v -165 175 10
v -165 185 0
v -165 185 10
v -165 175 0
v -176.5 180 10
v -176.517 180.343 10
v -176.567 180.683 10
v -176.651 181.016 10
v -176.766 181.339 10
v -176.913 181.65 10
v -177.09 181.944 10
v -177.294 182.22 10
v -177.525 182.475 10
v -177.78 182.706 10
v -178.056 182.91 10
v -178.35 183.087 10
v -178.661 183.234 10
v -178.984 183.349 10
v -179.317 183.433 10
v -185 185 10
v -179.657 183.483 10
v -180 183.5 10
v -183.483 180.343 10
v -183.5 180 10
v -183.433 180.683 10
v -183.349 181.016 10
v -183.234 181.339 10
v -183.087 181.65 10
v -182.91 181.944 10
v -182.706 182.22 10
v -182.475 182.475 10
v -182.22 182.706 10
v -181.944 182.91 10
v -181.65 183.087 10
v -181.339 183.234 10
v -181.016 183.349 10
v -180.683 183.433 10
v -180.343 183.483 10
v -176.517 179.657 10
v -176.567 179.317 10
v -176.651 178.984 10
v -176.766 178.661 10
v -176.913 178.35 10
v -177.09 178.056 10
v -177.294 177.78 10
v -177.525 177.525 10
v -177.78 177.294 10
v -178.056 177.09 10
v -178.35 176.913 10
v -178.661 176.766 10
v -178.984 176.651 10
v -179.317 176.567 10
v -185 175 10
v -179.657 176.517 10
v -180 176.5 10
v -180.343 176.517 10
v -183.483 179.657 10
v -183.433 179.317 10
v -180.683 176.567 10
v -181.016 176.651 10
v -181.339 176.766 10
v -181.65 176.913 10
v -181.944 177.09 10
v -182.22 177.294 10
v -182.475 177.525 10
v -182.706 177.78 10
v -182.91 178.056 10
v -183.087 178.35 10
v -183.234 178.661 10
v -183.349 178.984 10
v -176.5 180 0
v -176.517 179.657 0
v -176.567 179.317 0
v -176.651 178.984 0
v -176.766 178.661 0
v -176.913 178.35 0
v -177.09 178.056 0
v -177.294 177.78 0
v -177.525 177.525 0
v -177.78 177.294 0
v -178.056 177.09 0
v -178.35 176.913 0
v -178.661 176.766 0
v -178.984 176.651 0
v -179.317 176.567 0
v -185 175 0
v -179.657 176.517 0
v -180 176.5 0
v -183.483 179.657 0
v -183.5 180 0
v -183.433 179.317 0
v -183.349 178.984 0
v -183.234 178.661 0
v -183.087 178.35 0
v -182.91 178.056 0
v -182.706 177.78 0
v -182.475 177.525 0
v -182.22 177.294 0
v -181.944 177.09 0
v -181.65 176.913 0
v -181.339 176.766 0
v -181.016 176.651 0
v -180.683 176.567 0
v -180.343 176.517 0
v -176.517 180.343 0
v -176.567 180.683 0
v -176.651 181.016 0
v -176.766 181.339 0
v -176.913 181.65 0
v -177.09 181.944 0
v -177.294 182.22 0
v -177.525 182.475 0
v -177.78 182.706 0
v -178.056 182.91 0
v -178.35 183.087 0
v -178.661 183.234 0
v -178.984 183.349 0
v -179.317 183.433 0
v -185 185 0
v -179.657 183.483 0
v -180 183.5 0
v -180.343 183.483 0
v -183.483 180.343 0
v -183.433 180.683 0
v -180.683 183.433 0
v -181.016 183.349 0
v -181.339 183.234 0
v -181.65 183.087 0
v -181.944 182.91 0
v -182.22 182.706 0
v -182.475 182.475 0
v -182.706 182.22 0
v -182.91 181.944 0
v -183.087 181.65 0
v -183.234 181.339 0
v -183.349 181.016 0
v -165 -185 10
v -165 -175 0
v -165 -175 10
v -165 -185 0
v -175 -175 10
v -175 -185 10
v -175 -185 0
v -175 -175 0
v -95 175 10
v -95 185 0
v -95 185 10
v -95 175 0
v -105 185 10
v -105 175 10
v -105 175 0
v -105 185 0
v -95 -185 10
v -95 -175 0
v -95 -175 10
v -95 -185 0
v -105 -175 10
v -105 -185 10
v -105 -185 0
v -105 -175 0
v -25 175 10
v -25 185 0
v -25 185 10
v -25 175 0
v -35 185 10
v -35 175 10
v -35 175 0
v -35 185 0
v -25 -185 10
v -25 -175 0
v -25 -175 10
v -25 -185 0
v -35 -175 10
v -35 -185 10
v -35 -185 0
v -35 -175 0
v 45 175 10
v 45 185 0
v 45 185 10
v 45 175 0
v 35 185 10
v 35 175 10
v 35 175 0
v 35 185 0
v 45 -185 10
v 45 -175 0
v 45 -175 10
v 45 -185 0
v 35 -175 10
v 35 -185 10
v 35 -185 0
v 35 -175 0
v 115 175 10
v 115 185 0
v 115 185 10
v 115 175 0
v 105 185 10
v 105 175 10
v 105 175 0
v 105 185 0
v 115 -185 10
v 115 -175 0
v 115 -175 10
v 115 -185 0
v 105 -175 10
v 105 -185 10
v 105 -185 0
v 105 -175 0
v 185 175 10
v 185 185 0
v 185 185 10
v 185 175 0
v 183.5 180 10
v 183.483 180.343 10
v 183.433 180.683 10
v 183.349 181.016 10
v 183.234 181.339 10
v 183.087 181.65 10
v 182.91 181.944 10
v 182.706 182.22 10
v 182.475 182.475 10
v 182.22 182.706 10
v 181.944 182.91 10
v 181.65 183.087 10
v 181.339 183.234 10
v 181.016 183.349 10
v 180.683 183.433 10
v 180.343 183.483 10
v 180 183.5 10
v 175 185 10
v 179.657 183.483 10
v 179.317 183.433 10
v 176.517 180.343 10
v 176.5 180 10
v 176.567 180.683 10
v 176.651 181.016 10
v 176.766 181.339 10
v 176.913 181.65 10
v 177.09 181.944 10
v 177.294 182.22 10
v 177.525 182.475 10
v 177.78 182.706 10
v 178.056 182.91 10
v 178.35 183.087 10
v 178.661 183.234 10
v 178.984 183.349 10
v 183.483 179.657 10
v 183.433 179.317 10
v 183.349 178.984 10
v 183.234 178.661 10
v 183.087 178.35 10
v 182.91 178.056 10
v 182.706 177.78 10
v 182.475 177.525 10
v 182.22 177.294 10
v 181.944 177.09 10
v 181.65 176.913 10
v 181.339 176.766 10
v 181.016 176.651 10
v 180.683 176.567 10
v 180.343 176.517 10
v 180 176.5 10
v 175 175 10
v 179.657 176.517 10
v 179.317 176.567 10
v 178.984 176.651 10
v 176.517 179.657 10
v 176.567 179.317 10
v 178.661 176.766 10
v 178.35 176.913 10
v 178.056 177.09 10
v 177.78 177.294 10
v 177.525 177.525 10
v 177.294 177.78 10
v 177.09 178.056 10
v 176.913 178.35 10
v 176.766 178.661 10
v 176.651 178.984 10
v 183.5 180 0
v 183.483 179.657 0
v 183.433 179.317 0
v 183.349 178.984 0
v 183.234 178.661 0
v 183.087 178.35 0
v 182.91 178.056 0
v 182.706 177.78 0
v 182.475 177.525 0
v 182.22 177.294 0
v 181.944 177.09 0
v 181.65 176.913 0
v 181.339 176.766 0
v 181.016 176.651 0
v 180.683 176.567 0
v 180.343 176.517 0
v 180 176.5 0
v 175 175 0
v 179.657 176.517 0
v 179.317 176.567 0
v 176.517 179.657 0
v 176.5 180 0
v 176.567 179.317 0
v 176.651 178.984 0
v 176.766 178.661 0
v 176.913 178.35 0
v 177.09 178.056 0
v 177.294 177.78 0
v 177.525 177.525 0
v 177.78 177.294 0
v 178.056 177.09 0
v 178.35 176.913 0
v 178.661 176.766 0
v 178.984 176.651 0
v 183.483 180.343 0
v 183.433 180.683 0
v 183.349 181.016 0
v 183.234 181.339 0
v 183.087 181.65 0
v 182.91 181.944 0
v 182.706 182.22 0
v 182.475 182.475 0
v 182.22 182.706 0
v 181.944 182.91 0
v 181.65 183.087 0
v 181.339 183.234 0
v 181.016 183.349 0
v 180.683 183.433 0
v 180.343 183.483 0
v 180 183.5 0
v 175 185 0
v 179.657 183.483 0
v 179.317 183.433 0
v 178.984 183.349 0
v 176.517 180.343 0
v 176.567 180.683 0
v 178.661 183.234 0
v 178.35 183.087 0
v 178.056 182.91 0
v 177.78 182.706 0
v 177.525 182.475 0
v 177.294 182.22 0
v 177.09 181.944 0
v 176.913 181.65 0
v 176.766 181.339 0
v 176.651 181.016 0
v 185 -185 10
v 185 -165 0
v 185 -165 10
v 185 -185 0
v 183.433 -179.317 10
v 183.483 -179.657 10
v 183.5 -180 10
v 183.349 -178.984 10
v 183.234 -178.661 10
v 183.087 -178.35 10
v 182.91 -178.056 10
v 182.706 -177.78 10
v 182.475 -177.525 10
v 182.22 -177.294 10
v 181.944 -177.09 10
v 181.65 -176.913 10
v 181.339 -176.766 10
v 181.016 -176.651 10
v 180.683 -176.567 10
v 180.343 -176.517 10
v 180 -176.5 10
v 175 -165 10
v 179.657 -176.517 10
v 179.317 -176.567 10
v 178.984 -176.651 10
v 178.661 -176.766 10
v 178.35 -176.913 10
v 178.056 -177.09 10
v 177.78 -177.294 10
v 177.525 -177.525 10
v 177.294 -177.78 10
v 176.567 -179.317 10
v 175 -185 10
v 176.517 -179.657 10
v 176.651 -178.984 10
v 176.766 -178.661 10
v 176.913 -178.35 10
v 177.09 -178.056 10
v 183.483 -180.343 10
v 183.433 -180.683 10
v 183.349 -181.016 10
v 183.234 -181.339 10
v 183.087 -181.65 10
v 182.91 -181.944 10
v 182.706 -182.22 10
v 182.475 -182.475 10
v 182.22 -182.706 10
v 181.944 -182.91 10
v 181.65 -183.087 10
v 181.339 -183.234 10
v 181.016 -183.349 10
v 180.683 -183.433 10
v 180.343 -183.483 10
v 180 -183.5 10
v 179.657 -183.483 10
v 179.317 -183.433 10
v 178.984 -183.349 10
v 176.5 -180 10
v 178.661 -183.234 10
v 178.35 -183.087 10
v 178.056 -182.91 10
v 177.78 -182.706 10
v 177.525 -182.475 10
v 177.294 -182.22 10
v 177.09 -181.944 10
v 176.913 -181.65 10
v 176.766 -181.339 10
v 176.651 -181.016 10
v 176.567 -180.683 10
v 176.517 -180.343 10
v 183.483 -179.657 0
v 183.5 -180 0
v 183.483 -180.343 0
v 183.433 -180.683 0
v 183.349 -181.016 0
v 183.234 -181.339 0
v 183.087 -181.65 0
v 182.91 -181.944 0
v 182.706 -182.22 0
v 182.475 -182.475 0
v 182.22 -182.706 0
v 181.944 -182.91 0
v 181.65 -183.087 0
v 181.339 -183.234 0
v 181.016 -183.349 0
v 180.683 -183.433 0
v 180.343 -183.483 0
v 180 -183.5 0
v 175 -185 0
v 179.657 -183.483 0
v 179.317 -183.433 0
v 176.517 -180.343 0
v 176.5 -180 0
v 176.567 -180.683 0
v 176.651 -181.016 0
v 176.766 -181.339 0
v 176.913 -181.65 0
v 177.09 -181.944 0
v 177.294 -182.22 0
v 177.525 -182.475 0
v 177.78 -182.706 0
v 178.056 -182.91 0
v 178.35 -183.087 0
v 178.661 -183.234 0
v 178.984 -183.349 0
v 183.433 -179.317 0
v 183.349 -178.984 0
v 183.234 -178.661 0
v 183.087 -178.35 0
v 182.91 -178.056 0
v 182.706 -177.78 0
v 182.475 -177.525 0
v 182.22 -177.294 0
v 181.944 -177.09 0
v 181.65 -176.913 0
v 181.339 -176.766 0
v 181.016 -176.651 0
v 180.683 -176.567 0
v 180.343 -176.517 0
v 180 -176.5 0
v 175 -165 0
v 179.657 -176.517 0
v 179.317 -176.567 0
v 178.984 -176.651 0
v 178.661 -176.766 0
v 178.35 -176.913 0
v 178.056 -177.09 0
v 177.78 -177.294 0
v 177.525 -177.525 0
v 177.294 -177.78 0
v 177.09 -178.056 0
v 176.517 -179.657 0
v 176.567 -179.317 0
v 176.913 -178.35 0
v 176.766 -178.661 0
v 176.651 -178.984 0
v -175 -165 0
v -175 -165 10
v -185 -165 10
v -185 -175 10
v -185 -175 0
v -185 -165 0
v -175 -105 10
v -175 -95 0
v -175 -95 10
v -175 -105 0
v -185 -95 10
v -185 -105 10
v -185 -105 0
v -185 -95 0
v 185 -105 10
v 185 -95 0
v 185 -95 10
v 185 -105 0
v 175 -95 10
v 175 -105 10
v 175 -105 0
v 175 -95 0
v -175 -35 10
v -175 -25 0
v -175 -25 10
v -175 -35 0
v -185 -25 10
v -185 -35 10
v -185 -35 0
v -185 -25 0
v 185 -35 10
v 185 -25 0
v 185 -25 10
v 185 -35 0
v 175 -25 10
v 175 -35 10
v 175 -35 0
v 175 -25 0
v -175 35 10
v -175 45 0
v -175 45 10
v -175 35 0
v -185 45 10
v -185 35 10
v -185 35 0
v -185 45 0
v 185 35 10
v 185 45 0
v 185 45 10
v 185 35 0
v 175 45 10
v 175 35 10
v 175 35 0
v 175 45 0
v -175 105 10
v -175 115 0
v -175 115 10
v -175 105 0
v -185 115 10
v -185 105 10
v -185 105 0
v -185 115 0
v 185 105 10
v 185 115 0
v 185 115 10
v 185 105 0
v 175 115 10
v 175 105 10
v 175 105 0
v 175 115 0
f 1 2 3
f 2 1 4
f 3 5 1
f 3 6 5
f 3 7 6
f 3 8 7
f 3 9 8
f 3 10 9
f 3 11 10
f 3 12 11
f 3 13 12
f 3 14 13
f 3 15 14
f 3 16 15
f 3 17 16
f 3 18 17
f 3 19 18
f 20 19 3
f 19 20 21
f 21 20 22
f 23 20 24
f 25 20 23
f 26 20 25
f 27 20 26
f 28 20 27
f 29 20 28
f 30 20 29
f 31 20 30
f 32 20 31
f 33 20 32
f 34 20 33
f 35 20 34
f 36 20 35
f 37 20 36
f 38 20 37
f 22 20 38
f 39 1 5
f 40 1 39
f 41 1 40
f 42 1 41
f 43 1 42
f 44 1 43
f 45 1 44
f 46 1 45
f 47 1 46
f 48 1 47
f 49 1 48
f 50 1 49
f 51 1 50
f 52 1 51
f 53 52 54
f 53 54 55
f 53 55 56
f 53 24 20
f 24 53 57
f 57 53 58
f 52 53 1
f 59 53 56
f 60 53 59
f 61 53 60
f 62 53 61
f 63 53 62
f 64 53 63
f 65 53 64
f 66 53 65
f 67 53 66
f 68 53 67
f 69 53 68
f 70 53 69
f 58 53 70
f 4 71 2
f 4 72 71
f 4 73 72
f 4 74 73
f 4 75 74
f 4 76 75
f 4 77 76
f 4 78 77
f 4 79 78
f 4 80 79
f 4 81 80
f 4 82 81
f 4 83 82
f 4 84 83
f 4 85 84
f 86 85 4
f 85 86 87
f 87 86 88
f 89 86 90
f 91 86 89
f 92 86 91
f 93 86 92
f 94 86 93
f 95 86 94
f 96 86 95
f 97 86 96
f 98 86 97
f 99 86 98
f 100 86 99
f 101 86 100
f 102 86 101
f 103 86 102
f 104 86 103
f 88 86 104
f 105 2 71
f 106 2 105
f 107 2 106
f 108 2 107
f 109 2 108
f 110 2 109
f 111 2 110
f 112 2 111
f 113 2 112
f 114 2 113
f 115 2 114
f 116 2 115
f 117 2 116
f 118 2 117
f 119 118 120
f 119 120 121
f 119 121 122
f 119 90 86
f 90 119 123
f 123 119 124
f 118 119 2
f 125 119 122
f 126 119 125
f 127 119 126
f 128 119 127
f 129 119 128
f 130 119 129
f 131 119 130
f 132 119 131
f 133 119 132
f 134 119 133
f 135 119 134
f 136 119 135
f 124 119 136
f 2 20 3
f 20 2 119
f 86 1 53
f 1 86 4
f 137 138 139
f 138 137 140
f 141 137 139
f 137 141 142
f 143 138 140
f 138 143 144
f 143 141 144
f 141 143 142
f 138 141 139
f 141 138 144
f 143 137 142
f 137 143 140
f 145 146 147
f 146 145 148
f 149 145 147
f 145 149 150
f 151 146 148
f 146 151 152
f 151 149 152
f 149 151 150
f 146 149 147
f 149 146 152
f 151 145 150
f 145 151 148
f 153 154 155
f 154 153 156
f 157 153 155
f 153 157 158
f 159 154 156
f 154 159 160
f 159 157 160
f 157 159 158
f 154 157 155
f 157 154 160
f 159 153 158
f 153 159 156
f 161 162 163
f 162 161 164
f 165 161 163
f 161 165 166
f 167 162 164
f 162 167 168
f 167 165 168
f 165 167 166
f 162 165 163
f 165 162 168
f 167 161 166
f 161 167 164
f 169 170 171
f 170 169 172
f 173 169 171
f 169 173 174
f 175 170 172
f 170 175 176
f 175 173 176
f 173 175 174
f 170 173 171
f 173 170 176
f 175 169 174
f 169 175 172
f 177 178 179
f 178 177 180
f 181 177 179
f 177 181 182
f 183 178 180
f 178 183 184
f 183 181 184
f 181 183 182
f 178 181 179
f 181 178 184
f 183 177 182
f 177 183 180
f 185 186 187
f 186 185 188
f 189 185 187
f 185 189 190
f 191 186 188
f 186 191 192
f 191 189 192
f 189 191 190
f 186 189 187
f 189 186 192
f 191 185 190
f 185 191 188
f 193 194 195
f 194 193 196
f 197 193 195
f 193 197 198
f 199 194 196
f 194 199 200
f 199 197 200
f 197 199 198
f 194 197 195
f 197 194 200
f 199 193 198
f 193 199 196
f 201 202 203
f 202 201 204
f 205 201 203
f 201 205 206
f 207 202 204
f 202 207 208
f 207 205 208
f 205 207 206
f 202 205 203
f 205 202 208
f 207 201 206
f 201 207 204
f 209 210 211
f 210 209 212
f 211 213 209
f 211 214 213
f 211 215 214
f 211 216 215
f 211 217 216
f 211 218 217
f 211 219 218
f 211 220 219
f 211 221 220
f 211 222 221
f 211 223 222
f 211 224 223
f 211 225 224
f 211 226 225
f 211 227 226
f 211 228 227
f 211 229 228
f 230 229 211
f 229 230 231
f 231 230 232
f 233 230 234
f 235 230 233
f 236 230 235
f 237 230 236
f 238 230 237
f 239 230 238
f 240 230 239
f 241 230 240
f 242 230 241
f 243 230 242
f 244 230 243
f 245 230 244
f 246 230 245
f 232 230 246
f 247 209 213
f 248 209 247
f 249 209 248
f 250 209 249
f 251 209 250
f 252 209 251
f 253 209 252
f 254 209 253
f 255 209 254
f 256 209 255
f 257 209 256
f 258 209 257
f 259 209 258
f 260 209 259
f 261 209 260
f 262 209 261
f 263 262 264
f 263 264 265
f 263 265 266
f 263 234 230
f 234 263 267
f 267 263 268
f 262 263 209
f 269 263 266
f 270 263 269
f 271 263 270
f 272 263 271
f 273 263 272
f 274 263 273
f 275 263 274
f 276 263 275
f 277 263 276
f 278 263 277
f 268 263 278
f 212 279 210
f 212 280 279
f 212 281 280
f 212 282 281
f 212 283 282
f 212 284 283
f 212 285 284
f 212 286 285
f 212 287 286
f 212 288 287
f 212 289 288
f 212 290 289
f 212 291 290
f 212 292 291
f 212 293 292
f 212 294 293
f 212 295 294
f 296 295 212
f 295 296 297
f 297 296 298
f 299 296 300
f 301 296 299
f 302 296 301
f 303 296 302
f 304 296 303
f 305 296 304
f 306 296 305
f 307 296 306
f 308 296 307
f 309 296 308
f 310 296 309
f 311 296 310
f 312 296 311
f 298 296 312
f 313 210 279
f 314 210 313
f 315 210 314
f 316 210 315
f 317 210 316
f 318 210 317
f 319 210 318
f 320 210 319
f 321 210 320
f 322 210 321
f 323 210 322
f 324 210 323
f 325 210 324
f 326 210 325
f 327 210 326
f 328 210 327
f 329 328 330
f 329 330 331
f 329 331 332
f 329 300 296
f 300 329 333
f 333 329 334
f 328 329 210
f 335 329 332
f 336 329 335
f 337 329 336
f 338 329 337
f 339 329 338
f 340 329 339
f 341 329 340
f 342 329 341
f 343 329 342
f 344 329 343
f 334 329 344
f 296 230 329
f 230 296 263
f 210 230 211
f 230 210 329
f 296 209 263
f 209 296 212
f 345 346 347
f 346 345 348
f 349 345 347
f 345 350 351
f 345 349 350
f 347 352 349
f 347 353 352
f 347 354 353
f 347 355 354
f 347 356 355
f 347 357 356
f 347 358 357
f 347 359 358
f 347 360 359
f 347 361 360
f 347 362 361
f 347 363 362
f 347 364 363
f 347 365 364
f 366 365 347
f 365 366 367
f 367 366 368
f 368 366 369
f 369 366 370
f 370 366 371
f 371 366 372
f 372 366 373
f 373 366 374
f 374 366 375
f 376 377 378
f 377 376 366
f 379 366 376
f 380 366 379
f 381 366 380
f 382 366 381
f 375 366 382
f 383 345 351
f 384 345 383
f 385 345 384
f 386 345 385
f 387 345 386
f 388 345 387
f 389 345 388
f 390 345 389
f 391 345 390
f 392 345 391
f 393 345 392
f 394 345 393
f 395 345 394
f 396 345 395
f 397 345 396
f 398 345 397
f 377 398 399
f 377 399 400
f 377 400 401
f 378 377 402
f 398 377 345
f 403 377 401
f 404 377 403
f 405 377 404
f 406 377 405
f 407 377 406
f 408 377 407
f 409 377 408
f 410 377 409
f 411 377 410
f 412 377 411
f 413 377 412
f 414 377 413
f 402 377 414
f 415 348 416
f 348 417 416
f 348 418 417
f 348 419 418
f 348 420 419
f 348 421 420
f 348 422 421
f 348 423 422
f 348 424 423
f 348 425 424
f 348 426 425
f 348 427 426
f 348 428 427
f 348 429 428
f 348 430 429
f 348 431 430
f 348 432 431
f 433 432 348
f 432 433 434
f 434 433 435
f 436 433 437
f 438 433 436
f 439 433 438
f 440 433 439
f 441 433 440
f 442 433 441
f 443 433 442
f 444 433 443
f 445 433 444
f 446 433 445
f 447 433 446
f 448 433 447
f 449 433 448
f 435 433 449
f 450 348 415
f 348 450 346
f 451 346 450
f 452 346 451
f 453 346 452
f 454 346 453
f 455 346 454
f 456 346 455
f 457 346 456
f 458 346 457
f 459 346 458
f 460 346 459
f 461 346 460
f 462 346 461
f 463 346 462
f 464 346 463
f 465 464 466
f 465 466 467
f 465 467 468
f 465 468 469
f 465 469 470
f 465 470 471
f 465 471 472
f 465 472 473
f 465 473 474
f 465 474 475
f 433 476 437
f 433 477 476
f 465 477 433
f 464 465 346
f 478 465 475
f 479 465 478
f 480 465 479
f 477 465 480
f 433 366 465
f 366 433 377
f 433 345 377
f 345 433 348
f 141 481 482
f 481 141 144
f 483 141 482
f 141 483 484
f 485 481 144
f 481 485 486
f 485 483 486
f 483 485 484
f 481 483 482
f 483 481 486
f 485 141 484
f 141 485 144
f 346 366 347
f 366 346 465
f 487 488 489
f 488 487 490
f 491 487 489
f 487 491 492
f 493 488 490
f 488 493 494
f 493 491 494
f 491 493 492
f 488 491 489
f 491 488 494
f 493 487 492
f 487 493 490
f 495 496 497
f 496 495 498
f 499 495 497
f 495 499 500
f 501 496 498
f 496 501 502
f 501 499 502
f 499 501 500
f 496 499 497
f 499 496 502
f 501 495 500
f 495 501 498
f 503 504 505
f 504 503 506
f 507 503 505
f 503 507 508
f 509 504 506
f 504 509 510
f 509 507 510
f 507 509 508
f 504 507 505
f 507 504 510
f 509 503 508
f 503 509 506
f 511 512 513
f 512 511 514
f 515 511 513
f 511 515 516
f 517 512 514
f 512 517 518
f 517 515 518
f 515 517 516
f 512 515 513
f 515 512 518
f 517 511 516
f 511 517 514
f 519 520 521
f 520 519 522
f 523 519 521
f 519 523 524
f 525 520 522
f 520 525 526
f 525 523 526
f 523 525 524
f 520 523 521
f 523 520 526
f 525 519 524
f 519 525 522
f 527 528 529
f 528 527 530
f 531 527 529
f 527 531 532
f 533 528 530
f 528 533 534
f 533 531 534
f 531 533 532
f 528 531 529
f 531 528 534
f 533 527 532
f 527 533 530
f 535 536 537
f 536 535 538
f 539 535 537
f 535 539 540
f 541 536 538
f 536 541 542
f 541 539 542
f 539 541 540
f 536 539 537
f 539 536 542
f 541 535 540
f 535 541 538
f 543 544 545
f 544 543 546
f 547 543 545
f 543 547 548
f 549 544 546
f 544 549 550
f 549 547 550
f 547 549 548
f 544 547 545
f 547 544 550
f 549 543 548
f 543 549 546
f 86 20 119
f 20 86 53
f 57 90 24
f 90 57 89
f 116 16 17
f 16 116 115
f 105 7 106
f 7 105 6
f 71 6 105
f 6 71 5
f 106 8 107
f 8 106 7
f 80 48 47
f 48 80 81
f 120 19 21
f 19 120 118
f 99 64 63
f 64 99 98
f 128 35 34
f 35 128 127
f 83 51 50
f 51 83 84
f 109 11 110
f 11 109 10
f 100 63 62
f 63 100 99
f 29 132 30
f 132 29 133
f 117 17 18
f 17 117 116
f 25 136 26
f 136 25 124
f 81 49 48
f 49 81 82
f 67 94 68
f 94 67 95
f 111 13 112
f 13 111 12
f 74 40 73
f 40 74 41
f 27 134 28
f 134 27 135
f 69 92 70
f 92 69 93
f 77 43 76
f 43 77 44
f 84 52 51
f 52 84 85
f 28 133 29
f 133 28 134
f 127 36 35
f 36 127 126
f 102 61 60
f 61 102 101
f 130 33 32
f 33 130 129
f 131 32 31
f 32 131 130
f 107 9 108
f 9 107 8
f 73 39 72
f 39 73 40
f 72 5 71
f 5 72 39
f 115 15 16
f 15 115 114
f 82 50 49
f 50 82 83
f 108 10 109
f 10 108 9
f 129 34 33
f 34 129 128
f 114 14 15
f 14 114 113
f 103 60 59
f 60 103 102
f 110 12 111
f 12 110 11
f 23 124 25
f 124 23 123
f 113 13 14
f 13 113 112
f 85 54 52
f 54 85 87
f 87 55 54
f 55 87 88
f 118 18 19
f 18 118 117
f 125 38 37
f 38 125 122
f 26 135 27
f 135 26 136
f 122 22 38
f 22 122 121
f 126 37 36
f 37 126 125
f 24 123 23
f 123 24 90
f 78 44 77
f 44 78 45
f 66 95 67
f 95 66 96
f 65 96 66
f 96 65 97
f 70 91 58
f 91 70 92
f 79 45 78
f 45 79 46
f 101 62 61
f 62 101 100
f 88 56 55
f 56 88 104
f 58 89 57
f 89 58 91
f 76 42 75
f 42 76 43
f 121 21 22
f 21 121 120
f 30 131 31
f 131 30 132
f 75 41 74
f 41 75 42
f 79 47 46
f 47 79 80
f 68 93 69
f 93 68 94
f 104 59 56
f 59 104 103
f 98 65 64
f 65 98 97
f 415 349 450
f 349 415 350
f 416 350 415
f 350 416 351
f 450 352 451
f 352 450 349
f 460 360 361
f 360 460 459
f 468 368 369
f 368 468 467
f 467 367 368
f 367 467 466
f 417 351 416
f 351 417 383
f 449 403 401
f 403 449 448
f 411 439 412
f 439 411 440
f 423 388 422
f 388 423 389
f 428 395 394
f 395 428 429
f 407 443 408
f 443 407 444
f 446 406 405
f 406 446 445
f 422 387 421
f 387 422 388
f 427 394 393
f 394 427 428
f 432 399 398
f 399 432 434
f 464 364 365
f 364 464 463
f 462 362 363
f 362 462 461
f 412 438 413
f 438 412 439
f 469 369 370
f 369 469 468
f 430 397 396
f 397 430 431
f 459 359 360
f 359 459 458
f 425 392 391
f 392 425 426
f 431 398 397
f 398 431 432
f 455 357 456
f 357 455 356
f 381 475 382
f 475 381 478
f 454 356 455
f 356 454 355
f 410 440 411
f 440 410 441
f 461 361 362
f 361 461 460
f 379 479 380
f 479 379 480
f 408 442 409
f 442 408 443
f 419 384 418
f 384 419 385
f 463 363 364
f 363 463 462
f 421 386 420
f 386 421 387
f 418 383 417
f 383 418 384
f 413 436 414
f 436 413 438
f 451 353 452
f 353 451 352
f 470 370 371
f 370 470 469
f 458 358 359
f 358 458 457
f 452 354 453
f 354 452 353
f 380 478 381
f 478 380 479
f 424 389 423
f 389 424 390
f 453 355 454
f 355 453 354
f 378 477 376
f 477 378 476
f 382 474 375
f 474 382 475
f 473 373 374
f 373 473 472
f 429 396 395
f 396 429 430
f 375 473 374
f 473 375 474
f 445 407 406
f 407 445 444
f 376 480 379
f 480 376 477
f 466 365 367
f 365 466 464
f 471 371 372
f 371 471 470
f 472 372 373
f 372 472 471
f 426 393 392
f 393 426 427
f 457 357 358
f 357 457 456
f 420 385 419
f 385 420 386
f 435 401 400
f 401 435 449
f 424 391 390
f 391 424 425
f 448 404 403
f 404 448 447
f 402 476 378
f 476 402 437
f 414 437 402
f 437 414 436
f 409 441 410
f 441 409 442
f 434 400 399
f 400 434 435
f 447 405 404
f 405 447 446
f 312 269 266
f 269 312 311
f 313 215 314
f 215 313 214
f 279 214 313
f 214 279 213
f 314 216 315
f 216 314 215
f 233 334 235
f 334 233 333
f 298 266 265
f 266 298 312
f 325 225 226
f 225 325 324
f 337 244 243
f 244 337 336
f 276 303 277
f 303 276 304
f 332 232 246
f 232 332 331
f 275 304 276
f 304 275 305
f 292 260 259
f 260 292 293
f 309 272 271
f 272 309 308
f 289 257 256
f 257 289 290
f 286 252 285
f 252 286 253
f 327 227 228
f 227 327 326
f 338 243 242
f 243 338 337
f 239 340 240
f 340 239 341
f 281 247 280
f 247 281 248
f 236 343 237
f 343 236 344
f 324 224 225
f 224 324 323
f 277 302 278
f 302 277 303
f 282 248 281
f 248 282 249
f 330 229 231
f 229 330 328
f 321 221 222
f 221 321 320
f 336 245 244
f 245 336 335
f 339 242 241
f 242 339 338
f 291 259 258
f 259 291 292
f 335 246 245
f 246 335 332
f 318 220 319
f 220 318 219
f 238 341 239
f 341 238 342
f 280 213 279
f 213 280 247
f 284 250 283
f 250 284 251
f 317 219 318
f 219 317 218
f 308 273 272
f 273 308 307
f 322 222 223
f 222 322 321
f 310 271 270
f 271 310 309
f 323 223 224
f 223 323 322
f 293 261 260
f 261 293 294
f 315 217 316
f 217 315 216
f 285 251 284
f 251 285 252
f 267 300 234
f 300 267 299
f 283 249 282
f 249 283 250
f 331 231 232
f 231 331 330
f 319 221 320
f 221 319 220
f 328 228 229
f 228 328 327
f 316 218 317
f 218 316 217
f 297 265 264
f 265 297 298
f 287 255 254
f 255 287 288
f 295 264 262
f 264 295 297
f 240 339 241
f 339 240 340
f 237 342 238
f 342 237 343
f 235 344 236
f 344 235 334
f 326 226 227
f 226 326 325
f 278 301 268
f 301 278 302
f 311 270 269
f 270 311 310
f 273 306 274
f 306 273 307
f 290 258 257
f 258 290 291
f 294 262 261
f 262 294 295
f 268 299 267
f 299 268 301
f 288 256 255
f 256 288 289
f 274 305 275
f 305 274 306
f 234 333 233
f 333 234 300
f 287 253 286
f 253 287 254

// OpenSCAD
// ring_13.scad - ring index 13 (z bottom = 130 mm)
$fn = 64; bar = 10; half_b = bar/2; outer = 370; half_outer = outer/2;
front_y = 180; back_y = -180; left_x = -180; right_x = 180;
x_centers = [-170, -100, -30, 40, 110, 180];
z_centers = [5, 85, 155, 225, 295, 365, 435, 505, 575, 645, 715]; ring_z = 130;
module place_box(cx, cy, sx, sy) { translate([cx - sx/2, cy - sy/2, 0]) cube([sx, sy, bar]); }

difference() { union() {
    for (x = x_centers) { place_box(x, front_y, bar, bar); place_box(x, back_y, bar, bar); }
    for (y = x_centers) { place_box(left_x, y, bar, bar); place_box(right_x, y, bar, bar); }
    for (zc = z_centers) if ((zc - half_b < ring_z + bar) && (zc + half_b > ring_z)) {
        translate([-half_outer, front_y - half_b, 0]) cube([outer, bar, bar]);
        translate([-half_outer, back_y - half_b, 0])  cube([outer, bar, bar]);
        translate([left_x - half_b, -half_outer, 0])  cube([bar, outer, bar]);
        translate([right_x - half_b, -half_outer, 0]) cube([bar, outer, bar]);
    }
  }
  for (cx = [-180, 180]) for (cy = [-180, 180]) translate([cx, cy, 0]) cylinder(h = bar, r = 3.5, $fn = 64);
}
